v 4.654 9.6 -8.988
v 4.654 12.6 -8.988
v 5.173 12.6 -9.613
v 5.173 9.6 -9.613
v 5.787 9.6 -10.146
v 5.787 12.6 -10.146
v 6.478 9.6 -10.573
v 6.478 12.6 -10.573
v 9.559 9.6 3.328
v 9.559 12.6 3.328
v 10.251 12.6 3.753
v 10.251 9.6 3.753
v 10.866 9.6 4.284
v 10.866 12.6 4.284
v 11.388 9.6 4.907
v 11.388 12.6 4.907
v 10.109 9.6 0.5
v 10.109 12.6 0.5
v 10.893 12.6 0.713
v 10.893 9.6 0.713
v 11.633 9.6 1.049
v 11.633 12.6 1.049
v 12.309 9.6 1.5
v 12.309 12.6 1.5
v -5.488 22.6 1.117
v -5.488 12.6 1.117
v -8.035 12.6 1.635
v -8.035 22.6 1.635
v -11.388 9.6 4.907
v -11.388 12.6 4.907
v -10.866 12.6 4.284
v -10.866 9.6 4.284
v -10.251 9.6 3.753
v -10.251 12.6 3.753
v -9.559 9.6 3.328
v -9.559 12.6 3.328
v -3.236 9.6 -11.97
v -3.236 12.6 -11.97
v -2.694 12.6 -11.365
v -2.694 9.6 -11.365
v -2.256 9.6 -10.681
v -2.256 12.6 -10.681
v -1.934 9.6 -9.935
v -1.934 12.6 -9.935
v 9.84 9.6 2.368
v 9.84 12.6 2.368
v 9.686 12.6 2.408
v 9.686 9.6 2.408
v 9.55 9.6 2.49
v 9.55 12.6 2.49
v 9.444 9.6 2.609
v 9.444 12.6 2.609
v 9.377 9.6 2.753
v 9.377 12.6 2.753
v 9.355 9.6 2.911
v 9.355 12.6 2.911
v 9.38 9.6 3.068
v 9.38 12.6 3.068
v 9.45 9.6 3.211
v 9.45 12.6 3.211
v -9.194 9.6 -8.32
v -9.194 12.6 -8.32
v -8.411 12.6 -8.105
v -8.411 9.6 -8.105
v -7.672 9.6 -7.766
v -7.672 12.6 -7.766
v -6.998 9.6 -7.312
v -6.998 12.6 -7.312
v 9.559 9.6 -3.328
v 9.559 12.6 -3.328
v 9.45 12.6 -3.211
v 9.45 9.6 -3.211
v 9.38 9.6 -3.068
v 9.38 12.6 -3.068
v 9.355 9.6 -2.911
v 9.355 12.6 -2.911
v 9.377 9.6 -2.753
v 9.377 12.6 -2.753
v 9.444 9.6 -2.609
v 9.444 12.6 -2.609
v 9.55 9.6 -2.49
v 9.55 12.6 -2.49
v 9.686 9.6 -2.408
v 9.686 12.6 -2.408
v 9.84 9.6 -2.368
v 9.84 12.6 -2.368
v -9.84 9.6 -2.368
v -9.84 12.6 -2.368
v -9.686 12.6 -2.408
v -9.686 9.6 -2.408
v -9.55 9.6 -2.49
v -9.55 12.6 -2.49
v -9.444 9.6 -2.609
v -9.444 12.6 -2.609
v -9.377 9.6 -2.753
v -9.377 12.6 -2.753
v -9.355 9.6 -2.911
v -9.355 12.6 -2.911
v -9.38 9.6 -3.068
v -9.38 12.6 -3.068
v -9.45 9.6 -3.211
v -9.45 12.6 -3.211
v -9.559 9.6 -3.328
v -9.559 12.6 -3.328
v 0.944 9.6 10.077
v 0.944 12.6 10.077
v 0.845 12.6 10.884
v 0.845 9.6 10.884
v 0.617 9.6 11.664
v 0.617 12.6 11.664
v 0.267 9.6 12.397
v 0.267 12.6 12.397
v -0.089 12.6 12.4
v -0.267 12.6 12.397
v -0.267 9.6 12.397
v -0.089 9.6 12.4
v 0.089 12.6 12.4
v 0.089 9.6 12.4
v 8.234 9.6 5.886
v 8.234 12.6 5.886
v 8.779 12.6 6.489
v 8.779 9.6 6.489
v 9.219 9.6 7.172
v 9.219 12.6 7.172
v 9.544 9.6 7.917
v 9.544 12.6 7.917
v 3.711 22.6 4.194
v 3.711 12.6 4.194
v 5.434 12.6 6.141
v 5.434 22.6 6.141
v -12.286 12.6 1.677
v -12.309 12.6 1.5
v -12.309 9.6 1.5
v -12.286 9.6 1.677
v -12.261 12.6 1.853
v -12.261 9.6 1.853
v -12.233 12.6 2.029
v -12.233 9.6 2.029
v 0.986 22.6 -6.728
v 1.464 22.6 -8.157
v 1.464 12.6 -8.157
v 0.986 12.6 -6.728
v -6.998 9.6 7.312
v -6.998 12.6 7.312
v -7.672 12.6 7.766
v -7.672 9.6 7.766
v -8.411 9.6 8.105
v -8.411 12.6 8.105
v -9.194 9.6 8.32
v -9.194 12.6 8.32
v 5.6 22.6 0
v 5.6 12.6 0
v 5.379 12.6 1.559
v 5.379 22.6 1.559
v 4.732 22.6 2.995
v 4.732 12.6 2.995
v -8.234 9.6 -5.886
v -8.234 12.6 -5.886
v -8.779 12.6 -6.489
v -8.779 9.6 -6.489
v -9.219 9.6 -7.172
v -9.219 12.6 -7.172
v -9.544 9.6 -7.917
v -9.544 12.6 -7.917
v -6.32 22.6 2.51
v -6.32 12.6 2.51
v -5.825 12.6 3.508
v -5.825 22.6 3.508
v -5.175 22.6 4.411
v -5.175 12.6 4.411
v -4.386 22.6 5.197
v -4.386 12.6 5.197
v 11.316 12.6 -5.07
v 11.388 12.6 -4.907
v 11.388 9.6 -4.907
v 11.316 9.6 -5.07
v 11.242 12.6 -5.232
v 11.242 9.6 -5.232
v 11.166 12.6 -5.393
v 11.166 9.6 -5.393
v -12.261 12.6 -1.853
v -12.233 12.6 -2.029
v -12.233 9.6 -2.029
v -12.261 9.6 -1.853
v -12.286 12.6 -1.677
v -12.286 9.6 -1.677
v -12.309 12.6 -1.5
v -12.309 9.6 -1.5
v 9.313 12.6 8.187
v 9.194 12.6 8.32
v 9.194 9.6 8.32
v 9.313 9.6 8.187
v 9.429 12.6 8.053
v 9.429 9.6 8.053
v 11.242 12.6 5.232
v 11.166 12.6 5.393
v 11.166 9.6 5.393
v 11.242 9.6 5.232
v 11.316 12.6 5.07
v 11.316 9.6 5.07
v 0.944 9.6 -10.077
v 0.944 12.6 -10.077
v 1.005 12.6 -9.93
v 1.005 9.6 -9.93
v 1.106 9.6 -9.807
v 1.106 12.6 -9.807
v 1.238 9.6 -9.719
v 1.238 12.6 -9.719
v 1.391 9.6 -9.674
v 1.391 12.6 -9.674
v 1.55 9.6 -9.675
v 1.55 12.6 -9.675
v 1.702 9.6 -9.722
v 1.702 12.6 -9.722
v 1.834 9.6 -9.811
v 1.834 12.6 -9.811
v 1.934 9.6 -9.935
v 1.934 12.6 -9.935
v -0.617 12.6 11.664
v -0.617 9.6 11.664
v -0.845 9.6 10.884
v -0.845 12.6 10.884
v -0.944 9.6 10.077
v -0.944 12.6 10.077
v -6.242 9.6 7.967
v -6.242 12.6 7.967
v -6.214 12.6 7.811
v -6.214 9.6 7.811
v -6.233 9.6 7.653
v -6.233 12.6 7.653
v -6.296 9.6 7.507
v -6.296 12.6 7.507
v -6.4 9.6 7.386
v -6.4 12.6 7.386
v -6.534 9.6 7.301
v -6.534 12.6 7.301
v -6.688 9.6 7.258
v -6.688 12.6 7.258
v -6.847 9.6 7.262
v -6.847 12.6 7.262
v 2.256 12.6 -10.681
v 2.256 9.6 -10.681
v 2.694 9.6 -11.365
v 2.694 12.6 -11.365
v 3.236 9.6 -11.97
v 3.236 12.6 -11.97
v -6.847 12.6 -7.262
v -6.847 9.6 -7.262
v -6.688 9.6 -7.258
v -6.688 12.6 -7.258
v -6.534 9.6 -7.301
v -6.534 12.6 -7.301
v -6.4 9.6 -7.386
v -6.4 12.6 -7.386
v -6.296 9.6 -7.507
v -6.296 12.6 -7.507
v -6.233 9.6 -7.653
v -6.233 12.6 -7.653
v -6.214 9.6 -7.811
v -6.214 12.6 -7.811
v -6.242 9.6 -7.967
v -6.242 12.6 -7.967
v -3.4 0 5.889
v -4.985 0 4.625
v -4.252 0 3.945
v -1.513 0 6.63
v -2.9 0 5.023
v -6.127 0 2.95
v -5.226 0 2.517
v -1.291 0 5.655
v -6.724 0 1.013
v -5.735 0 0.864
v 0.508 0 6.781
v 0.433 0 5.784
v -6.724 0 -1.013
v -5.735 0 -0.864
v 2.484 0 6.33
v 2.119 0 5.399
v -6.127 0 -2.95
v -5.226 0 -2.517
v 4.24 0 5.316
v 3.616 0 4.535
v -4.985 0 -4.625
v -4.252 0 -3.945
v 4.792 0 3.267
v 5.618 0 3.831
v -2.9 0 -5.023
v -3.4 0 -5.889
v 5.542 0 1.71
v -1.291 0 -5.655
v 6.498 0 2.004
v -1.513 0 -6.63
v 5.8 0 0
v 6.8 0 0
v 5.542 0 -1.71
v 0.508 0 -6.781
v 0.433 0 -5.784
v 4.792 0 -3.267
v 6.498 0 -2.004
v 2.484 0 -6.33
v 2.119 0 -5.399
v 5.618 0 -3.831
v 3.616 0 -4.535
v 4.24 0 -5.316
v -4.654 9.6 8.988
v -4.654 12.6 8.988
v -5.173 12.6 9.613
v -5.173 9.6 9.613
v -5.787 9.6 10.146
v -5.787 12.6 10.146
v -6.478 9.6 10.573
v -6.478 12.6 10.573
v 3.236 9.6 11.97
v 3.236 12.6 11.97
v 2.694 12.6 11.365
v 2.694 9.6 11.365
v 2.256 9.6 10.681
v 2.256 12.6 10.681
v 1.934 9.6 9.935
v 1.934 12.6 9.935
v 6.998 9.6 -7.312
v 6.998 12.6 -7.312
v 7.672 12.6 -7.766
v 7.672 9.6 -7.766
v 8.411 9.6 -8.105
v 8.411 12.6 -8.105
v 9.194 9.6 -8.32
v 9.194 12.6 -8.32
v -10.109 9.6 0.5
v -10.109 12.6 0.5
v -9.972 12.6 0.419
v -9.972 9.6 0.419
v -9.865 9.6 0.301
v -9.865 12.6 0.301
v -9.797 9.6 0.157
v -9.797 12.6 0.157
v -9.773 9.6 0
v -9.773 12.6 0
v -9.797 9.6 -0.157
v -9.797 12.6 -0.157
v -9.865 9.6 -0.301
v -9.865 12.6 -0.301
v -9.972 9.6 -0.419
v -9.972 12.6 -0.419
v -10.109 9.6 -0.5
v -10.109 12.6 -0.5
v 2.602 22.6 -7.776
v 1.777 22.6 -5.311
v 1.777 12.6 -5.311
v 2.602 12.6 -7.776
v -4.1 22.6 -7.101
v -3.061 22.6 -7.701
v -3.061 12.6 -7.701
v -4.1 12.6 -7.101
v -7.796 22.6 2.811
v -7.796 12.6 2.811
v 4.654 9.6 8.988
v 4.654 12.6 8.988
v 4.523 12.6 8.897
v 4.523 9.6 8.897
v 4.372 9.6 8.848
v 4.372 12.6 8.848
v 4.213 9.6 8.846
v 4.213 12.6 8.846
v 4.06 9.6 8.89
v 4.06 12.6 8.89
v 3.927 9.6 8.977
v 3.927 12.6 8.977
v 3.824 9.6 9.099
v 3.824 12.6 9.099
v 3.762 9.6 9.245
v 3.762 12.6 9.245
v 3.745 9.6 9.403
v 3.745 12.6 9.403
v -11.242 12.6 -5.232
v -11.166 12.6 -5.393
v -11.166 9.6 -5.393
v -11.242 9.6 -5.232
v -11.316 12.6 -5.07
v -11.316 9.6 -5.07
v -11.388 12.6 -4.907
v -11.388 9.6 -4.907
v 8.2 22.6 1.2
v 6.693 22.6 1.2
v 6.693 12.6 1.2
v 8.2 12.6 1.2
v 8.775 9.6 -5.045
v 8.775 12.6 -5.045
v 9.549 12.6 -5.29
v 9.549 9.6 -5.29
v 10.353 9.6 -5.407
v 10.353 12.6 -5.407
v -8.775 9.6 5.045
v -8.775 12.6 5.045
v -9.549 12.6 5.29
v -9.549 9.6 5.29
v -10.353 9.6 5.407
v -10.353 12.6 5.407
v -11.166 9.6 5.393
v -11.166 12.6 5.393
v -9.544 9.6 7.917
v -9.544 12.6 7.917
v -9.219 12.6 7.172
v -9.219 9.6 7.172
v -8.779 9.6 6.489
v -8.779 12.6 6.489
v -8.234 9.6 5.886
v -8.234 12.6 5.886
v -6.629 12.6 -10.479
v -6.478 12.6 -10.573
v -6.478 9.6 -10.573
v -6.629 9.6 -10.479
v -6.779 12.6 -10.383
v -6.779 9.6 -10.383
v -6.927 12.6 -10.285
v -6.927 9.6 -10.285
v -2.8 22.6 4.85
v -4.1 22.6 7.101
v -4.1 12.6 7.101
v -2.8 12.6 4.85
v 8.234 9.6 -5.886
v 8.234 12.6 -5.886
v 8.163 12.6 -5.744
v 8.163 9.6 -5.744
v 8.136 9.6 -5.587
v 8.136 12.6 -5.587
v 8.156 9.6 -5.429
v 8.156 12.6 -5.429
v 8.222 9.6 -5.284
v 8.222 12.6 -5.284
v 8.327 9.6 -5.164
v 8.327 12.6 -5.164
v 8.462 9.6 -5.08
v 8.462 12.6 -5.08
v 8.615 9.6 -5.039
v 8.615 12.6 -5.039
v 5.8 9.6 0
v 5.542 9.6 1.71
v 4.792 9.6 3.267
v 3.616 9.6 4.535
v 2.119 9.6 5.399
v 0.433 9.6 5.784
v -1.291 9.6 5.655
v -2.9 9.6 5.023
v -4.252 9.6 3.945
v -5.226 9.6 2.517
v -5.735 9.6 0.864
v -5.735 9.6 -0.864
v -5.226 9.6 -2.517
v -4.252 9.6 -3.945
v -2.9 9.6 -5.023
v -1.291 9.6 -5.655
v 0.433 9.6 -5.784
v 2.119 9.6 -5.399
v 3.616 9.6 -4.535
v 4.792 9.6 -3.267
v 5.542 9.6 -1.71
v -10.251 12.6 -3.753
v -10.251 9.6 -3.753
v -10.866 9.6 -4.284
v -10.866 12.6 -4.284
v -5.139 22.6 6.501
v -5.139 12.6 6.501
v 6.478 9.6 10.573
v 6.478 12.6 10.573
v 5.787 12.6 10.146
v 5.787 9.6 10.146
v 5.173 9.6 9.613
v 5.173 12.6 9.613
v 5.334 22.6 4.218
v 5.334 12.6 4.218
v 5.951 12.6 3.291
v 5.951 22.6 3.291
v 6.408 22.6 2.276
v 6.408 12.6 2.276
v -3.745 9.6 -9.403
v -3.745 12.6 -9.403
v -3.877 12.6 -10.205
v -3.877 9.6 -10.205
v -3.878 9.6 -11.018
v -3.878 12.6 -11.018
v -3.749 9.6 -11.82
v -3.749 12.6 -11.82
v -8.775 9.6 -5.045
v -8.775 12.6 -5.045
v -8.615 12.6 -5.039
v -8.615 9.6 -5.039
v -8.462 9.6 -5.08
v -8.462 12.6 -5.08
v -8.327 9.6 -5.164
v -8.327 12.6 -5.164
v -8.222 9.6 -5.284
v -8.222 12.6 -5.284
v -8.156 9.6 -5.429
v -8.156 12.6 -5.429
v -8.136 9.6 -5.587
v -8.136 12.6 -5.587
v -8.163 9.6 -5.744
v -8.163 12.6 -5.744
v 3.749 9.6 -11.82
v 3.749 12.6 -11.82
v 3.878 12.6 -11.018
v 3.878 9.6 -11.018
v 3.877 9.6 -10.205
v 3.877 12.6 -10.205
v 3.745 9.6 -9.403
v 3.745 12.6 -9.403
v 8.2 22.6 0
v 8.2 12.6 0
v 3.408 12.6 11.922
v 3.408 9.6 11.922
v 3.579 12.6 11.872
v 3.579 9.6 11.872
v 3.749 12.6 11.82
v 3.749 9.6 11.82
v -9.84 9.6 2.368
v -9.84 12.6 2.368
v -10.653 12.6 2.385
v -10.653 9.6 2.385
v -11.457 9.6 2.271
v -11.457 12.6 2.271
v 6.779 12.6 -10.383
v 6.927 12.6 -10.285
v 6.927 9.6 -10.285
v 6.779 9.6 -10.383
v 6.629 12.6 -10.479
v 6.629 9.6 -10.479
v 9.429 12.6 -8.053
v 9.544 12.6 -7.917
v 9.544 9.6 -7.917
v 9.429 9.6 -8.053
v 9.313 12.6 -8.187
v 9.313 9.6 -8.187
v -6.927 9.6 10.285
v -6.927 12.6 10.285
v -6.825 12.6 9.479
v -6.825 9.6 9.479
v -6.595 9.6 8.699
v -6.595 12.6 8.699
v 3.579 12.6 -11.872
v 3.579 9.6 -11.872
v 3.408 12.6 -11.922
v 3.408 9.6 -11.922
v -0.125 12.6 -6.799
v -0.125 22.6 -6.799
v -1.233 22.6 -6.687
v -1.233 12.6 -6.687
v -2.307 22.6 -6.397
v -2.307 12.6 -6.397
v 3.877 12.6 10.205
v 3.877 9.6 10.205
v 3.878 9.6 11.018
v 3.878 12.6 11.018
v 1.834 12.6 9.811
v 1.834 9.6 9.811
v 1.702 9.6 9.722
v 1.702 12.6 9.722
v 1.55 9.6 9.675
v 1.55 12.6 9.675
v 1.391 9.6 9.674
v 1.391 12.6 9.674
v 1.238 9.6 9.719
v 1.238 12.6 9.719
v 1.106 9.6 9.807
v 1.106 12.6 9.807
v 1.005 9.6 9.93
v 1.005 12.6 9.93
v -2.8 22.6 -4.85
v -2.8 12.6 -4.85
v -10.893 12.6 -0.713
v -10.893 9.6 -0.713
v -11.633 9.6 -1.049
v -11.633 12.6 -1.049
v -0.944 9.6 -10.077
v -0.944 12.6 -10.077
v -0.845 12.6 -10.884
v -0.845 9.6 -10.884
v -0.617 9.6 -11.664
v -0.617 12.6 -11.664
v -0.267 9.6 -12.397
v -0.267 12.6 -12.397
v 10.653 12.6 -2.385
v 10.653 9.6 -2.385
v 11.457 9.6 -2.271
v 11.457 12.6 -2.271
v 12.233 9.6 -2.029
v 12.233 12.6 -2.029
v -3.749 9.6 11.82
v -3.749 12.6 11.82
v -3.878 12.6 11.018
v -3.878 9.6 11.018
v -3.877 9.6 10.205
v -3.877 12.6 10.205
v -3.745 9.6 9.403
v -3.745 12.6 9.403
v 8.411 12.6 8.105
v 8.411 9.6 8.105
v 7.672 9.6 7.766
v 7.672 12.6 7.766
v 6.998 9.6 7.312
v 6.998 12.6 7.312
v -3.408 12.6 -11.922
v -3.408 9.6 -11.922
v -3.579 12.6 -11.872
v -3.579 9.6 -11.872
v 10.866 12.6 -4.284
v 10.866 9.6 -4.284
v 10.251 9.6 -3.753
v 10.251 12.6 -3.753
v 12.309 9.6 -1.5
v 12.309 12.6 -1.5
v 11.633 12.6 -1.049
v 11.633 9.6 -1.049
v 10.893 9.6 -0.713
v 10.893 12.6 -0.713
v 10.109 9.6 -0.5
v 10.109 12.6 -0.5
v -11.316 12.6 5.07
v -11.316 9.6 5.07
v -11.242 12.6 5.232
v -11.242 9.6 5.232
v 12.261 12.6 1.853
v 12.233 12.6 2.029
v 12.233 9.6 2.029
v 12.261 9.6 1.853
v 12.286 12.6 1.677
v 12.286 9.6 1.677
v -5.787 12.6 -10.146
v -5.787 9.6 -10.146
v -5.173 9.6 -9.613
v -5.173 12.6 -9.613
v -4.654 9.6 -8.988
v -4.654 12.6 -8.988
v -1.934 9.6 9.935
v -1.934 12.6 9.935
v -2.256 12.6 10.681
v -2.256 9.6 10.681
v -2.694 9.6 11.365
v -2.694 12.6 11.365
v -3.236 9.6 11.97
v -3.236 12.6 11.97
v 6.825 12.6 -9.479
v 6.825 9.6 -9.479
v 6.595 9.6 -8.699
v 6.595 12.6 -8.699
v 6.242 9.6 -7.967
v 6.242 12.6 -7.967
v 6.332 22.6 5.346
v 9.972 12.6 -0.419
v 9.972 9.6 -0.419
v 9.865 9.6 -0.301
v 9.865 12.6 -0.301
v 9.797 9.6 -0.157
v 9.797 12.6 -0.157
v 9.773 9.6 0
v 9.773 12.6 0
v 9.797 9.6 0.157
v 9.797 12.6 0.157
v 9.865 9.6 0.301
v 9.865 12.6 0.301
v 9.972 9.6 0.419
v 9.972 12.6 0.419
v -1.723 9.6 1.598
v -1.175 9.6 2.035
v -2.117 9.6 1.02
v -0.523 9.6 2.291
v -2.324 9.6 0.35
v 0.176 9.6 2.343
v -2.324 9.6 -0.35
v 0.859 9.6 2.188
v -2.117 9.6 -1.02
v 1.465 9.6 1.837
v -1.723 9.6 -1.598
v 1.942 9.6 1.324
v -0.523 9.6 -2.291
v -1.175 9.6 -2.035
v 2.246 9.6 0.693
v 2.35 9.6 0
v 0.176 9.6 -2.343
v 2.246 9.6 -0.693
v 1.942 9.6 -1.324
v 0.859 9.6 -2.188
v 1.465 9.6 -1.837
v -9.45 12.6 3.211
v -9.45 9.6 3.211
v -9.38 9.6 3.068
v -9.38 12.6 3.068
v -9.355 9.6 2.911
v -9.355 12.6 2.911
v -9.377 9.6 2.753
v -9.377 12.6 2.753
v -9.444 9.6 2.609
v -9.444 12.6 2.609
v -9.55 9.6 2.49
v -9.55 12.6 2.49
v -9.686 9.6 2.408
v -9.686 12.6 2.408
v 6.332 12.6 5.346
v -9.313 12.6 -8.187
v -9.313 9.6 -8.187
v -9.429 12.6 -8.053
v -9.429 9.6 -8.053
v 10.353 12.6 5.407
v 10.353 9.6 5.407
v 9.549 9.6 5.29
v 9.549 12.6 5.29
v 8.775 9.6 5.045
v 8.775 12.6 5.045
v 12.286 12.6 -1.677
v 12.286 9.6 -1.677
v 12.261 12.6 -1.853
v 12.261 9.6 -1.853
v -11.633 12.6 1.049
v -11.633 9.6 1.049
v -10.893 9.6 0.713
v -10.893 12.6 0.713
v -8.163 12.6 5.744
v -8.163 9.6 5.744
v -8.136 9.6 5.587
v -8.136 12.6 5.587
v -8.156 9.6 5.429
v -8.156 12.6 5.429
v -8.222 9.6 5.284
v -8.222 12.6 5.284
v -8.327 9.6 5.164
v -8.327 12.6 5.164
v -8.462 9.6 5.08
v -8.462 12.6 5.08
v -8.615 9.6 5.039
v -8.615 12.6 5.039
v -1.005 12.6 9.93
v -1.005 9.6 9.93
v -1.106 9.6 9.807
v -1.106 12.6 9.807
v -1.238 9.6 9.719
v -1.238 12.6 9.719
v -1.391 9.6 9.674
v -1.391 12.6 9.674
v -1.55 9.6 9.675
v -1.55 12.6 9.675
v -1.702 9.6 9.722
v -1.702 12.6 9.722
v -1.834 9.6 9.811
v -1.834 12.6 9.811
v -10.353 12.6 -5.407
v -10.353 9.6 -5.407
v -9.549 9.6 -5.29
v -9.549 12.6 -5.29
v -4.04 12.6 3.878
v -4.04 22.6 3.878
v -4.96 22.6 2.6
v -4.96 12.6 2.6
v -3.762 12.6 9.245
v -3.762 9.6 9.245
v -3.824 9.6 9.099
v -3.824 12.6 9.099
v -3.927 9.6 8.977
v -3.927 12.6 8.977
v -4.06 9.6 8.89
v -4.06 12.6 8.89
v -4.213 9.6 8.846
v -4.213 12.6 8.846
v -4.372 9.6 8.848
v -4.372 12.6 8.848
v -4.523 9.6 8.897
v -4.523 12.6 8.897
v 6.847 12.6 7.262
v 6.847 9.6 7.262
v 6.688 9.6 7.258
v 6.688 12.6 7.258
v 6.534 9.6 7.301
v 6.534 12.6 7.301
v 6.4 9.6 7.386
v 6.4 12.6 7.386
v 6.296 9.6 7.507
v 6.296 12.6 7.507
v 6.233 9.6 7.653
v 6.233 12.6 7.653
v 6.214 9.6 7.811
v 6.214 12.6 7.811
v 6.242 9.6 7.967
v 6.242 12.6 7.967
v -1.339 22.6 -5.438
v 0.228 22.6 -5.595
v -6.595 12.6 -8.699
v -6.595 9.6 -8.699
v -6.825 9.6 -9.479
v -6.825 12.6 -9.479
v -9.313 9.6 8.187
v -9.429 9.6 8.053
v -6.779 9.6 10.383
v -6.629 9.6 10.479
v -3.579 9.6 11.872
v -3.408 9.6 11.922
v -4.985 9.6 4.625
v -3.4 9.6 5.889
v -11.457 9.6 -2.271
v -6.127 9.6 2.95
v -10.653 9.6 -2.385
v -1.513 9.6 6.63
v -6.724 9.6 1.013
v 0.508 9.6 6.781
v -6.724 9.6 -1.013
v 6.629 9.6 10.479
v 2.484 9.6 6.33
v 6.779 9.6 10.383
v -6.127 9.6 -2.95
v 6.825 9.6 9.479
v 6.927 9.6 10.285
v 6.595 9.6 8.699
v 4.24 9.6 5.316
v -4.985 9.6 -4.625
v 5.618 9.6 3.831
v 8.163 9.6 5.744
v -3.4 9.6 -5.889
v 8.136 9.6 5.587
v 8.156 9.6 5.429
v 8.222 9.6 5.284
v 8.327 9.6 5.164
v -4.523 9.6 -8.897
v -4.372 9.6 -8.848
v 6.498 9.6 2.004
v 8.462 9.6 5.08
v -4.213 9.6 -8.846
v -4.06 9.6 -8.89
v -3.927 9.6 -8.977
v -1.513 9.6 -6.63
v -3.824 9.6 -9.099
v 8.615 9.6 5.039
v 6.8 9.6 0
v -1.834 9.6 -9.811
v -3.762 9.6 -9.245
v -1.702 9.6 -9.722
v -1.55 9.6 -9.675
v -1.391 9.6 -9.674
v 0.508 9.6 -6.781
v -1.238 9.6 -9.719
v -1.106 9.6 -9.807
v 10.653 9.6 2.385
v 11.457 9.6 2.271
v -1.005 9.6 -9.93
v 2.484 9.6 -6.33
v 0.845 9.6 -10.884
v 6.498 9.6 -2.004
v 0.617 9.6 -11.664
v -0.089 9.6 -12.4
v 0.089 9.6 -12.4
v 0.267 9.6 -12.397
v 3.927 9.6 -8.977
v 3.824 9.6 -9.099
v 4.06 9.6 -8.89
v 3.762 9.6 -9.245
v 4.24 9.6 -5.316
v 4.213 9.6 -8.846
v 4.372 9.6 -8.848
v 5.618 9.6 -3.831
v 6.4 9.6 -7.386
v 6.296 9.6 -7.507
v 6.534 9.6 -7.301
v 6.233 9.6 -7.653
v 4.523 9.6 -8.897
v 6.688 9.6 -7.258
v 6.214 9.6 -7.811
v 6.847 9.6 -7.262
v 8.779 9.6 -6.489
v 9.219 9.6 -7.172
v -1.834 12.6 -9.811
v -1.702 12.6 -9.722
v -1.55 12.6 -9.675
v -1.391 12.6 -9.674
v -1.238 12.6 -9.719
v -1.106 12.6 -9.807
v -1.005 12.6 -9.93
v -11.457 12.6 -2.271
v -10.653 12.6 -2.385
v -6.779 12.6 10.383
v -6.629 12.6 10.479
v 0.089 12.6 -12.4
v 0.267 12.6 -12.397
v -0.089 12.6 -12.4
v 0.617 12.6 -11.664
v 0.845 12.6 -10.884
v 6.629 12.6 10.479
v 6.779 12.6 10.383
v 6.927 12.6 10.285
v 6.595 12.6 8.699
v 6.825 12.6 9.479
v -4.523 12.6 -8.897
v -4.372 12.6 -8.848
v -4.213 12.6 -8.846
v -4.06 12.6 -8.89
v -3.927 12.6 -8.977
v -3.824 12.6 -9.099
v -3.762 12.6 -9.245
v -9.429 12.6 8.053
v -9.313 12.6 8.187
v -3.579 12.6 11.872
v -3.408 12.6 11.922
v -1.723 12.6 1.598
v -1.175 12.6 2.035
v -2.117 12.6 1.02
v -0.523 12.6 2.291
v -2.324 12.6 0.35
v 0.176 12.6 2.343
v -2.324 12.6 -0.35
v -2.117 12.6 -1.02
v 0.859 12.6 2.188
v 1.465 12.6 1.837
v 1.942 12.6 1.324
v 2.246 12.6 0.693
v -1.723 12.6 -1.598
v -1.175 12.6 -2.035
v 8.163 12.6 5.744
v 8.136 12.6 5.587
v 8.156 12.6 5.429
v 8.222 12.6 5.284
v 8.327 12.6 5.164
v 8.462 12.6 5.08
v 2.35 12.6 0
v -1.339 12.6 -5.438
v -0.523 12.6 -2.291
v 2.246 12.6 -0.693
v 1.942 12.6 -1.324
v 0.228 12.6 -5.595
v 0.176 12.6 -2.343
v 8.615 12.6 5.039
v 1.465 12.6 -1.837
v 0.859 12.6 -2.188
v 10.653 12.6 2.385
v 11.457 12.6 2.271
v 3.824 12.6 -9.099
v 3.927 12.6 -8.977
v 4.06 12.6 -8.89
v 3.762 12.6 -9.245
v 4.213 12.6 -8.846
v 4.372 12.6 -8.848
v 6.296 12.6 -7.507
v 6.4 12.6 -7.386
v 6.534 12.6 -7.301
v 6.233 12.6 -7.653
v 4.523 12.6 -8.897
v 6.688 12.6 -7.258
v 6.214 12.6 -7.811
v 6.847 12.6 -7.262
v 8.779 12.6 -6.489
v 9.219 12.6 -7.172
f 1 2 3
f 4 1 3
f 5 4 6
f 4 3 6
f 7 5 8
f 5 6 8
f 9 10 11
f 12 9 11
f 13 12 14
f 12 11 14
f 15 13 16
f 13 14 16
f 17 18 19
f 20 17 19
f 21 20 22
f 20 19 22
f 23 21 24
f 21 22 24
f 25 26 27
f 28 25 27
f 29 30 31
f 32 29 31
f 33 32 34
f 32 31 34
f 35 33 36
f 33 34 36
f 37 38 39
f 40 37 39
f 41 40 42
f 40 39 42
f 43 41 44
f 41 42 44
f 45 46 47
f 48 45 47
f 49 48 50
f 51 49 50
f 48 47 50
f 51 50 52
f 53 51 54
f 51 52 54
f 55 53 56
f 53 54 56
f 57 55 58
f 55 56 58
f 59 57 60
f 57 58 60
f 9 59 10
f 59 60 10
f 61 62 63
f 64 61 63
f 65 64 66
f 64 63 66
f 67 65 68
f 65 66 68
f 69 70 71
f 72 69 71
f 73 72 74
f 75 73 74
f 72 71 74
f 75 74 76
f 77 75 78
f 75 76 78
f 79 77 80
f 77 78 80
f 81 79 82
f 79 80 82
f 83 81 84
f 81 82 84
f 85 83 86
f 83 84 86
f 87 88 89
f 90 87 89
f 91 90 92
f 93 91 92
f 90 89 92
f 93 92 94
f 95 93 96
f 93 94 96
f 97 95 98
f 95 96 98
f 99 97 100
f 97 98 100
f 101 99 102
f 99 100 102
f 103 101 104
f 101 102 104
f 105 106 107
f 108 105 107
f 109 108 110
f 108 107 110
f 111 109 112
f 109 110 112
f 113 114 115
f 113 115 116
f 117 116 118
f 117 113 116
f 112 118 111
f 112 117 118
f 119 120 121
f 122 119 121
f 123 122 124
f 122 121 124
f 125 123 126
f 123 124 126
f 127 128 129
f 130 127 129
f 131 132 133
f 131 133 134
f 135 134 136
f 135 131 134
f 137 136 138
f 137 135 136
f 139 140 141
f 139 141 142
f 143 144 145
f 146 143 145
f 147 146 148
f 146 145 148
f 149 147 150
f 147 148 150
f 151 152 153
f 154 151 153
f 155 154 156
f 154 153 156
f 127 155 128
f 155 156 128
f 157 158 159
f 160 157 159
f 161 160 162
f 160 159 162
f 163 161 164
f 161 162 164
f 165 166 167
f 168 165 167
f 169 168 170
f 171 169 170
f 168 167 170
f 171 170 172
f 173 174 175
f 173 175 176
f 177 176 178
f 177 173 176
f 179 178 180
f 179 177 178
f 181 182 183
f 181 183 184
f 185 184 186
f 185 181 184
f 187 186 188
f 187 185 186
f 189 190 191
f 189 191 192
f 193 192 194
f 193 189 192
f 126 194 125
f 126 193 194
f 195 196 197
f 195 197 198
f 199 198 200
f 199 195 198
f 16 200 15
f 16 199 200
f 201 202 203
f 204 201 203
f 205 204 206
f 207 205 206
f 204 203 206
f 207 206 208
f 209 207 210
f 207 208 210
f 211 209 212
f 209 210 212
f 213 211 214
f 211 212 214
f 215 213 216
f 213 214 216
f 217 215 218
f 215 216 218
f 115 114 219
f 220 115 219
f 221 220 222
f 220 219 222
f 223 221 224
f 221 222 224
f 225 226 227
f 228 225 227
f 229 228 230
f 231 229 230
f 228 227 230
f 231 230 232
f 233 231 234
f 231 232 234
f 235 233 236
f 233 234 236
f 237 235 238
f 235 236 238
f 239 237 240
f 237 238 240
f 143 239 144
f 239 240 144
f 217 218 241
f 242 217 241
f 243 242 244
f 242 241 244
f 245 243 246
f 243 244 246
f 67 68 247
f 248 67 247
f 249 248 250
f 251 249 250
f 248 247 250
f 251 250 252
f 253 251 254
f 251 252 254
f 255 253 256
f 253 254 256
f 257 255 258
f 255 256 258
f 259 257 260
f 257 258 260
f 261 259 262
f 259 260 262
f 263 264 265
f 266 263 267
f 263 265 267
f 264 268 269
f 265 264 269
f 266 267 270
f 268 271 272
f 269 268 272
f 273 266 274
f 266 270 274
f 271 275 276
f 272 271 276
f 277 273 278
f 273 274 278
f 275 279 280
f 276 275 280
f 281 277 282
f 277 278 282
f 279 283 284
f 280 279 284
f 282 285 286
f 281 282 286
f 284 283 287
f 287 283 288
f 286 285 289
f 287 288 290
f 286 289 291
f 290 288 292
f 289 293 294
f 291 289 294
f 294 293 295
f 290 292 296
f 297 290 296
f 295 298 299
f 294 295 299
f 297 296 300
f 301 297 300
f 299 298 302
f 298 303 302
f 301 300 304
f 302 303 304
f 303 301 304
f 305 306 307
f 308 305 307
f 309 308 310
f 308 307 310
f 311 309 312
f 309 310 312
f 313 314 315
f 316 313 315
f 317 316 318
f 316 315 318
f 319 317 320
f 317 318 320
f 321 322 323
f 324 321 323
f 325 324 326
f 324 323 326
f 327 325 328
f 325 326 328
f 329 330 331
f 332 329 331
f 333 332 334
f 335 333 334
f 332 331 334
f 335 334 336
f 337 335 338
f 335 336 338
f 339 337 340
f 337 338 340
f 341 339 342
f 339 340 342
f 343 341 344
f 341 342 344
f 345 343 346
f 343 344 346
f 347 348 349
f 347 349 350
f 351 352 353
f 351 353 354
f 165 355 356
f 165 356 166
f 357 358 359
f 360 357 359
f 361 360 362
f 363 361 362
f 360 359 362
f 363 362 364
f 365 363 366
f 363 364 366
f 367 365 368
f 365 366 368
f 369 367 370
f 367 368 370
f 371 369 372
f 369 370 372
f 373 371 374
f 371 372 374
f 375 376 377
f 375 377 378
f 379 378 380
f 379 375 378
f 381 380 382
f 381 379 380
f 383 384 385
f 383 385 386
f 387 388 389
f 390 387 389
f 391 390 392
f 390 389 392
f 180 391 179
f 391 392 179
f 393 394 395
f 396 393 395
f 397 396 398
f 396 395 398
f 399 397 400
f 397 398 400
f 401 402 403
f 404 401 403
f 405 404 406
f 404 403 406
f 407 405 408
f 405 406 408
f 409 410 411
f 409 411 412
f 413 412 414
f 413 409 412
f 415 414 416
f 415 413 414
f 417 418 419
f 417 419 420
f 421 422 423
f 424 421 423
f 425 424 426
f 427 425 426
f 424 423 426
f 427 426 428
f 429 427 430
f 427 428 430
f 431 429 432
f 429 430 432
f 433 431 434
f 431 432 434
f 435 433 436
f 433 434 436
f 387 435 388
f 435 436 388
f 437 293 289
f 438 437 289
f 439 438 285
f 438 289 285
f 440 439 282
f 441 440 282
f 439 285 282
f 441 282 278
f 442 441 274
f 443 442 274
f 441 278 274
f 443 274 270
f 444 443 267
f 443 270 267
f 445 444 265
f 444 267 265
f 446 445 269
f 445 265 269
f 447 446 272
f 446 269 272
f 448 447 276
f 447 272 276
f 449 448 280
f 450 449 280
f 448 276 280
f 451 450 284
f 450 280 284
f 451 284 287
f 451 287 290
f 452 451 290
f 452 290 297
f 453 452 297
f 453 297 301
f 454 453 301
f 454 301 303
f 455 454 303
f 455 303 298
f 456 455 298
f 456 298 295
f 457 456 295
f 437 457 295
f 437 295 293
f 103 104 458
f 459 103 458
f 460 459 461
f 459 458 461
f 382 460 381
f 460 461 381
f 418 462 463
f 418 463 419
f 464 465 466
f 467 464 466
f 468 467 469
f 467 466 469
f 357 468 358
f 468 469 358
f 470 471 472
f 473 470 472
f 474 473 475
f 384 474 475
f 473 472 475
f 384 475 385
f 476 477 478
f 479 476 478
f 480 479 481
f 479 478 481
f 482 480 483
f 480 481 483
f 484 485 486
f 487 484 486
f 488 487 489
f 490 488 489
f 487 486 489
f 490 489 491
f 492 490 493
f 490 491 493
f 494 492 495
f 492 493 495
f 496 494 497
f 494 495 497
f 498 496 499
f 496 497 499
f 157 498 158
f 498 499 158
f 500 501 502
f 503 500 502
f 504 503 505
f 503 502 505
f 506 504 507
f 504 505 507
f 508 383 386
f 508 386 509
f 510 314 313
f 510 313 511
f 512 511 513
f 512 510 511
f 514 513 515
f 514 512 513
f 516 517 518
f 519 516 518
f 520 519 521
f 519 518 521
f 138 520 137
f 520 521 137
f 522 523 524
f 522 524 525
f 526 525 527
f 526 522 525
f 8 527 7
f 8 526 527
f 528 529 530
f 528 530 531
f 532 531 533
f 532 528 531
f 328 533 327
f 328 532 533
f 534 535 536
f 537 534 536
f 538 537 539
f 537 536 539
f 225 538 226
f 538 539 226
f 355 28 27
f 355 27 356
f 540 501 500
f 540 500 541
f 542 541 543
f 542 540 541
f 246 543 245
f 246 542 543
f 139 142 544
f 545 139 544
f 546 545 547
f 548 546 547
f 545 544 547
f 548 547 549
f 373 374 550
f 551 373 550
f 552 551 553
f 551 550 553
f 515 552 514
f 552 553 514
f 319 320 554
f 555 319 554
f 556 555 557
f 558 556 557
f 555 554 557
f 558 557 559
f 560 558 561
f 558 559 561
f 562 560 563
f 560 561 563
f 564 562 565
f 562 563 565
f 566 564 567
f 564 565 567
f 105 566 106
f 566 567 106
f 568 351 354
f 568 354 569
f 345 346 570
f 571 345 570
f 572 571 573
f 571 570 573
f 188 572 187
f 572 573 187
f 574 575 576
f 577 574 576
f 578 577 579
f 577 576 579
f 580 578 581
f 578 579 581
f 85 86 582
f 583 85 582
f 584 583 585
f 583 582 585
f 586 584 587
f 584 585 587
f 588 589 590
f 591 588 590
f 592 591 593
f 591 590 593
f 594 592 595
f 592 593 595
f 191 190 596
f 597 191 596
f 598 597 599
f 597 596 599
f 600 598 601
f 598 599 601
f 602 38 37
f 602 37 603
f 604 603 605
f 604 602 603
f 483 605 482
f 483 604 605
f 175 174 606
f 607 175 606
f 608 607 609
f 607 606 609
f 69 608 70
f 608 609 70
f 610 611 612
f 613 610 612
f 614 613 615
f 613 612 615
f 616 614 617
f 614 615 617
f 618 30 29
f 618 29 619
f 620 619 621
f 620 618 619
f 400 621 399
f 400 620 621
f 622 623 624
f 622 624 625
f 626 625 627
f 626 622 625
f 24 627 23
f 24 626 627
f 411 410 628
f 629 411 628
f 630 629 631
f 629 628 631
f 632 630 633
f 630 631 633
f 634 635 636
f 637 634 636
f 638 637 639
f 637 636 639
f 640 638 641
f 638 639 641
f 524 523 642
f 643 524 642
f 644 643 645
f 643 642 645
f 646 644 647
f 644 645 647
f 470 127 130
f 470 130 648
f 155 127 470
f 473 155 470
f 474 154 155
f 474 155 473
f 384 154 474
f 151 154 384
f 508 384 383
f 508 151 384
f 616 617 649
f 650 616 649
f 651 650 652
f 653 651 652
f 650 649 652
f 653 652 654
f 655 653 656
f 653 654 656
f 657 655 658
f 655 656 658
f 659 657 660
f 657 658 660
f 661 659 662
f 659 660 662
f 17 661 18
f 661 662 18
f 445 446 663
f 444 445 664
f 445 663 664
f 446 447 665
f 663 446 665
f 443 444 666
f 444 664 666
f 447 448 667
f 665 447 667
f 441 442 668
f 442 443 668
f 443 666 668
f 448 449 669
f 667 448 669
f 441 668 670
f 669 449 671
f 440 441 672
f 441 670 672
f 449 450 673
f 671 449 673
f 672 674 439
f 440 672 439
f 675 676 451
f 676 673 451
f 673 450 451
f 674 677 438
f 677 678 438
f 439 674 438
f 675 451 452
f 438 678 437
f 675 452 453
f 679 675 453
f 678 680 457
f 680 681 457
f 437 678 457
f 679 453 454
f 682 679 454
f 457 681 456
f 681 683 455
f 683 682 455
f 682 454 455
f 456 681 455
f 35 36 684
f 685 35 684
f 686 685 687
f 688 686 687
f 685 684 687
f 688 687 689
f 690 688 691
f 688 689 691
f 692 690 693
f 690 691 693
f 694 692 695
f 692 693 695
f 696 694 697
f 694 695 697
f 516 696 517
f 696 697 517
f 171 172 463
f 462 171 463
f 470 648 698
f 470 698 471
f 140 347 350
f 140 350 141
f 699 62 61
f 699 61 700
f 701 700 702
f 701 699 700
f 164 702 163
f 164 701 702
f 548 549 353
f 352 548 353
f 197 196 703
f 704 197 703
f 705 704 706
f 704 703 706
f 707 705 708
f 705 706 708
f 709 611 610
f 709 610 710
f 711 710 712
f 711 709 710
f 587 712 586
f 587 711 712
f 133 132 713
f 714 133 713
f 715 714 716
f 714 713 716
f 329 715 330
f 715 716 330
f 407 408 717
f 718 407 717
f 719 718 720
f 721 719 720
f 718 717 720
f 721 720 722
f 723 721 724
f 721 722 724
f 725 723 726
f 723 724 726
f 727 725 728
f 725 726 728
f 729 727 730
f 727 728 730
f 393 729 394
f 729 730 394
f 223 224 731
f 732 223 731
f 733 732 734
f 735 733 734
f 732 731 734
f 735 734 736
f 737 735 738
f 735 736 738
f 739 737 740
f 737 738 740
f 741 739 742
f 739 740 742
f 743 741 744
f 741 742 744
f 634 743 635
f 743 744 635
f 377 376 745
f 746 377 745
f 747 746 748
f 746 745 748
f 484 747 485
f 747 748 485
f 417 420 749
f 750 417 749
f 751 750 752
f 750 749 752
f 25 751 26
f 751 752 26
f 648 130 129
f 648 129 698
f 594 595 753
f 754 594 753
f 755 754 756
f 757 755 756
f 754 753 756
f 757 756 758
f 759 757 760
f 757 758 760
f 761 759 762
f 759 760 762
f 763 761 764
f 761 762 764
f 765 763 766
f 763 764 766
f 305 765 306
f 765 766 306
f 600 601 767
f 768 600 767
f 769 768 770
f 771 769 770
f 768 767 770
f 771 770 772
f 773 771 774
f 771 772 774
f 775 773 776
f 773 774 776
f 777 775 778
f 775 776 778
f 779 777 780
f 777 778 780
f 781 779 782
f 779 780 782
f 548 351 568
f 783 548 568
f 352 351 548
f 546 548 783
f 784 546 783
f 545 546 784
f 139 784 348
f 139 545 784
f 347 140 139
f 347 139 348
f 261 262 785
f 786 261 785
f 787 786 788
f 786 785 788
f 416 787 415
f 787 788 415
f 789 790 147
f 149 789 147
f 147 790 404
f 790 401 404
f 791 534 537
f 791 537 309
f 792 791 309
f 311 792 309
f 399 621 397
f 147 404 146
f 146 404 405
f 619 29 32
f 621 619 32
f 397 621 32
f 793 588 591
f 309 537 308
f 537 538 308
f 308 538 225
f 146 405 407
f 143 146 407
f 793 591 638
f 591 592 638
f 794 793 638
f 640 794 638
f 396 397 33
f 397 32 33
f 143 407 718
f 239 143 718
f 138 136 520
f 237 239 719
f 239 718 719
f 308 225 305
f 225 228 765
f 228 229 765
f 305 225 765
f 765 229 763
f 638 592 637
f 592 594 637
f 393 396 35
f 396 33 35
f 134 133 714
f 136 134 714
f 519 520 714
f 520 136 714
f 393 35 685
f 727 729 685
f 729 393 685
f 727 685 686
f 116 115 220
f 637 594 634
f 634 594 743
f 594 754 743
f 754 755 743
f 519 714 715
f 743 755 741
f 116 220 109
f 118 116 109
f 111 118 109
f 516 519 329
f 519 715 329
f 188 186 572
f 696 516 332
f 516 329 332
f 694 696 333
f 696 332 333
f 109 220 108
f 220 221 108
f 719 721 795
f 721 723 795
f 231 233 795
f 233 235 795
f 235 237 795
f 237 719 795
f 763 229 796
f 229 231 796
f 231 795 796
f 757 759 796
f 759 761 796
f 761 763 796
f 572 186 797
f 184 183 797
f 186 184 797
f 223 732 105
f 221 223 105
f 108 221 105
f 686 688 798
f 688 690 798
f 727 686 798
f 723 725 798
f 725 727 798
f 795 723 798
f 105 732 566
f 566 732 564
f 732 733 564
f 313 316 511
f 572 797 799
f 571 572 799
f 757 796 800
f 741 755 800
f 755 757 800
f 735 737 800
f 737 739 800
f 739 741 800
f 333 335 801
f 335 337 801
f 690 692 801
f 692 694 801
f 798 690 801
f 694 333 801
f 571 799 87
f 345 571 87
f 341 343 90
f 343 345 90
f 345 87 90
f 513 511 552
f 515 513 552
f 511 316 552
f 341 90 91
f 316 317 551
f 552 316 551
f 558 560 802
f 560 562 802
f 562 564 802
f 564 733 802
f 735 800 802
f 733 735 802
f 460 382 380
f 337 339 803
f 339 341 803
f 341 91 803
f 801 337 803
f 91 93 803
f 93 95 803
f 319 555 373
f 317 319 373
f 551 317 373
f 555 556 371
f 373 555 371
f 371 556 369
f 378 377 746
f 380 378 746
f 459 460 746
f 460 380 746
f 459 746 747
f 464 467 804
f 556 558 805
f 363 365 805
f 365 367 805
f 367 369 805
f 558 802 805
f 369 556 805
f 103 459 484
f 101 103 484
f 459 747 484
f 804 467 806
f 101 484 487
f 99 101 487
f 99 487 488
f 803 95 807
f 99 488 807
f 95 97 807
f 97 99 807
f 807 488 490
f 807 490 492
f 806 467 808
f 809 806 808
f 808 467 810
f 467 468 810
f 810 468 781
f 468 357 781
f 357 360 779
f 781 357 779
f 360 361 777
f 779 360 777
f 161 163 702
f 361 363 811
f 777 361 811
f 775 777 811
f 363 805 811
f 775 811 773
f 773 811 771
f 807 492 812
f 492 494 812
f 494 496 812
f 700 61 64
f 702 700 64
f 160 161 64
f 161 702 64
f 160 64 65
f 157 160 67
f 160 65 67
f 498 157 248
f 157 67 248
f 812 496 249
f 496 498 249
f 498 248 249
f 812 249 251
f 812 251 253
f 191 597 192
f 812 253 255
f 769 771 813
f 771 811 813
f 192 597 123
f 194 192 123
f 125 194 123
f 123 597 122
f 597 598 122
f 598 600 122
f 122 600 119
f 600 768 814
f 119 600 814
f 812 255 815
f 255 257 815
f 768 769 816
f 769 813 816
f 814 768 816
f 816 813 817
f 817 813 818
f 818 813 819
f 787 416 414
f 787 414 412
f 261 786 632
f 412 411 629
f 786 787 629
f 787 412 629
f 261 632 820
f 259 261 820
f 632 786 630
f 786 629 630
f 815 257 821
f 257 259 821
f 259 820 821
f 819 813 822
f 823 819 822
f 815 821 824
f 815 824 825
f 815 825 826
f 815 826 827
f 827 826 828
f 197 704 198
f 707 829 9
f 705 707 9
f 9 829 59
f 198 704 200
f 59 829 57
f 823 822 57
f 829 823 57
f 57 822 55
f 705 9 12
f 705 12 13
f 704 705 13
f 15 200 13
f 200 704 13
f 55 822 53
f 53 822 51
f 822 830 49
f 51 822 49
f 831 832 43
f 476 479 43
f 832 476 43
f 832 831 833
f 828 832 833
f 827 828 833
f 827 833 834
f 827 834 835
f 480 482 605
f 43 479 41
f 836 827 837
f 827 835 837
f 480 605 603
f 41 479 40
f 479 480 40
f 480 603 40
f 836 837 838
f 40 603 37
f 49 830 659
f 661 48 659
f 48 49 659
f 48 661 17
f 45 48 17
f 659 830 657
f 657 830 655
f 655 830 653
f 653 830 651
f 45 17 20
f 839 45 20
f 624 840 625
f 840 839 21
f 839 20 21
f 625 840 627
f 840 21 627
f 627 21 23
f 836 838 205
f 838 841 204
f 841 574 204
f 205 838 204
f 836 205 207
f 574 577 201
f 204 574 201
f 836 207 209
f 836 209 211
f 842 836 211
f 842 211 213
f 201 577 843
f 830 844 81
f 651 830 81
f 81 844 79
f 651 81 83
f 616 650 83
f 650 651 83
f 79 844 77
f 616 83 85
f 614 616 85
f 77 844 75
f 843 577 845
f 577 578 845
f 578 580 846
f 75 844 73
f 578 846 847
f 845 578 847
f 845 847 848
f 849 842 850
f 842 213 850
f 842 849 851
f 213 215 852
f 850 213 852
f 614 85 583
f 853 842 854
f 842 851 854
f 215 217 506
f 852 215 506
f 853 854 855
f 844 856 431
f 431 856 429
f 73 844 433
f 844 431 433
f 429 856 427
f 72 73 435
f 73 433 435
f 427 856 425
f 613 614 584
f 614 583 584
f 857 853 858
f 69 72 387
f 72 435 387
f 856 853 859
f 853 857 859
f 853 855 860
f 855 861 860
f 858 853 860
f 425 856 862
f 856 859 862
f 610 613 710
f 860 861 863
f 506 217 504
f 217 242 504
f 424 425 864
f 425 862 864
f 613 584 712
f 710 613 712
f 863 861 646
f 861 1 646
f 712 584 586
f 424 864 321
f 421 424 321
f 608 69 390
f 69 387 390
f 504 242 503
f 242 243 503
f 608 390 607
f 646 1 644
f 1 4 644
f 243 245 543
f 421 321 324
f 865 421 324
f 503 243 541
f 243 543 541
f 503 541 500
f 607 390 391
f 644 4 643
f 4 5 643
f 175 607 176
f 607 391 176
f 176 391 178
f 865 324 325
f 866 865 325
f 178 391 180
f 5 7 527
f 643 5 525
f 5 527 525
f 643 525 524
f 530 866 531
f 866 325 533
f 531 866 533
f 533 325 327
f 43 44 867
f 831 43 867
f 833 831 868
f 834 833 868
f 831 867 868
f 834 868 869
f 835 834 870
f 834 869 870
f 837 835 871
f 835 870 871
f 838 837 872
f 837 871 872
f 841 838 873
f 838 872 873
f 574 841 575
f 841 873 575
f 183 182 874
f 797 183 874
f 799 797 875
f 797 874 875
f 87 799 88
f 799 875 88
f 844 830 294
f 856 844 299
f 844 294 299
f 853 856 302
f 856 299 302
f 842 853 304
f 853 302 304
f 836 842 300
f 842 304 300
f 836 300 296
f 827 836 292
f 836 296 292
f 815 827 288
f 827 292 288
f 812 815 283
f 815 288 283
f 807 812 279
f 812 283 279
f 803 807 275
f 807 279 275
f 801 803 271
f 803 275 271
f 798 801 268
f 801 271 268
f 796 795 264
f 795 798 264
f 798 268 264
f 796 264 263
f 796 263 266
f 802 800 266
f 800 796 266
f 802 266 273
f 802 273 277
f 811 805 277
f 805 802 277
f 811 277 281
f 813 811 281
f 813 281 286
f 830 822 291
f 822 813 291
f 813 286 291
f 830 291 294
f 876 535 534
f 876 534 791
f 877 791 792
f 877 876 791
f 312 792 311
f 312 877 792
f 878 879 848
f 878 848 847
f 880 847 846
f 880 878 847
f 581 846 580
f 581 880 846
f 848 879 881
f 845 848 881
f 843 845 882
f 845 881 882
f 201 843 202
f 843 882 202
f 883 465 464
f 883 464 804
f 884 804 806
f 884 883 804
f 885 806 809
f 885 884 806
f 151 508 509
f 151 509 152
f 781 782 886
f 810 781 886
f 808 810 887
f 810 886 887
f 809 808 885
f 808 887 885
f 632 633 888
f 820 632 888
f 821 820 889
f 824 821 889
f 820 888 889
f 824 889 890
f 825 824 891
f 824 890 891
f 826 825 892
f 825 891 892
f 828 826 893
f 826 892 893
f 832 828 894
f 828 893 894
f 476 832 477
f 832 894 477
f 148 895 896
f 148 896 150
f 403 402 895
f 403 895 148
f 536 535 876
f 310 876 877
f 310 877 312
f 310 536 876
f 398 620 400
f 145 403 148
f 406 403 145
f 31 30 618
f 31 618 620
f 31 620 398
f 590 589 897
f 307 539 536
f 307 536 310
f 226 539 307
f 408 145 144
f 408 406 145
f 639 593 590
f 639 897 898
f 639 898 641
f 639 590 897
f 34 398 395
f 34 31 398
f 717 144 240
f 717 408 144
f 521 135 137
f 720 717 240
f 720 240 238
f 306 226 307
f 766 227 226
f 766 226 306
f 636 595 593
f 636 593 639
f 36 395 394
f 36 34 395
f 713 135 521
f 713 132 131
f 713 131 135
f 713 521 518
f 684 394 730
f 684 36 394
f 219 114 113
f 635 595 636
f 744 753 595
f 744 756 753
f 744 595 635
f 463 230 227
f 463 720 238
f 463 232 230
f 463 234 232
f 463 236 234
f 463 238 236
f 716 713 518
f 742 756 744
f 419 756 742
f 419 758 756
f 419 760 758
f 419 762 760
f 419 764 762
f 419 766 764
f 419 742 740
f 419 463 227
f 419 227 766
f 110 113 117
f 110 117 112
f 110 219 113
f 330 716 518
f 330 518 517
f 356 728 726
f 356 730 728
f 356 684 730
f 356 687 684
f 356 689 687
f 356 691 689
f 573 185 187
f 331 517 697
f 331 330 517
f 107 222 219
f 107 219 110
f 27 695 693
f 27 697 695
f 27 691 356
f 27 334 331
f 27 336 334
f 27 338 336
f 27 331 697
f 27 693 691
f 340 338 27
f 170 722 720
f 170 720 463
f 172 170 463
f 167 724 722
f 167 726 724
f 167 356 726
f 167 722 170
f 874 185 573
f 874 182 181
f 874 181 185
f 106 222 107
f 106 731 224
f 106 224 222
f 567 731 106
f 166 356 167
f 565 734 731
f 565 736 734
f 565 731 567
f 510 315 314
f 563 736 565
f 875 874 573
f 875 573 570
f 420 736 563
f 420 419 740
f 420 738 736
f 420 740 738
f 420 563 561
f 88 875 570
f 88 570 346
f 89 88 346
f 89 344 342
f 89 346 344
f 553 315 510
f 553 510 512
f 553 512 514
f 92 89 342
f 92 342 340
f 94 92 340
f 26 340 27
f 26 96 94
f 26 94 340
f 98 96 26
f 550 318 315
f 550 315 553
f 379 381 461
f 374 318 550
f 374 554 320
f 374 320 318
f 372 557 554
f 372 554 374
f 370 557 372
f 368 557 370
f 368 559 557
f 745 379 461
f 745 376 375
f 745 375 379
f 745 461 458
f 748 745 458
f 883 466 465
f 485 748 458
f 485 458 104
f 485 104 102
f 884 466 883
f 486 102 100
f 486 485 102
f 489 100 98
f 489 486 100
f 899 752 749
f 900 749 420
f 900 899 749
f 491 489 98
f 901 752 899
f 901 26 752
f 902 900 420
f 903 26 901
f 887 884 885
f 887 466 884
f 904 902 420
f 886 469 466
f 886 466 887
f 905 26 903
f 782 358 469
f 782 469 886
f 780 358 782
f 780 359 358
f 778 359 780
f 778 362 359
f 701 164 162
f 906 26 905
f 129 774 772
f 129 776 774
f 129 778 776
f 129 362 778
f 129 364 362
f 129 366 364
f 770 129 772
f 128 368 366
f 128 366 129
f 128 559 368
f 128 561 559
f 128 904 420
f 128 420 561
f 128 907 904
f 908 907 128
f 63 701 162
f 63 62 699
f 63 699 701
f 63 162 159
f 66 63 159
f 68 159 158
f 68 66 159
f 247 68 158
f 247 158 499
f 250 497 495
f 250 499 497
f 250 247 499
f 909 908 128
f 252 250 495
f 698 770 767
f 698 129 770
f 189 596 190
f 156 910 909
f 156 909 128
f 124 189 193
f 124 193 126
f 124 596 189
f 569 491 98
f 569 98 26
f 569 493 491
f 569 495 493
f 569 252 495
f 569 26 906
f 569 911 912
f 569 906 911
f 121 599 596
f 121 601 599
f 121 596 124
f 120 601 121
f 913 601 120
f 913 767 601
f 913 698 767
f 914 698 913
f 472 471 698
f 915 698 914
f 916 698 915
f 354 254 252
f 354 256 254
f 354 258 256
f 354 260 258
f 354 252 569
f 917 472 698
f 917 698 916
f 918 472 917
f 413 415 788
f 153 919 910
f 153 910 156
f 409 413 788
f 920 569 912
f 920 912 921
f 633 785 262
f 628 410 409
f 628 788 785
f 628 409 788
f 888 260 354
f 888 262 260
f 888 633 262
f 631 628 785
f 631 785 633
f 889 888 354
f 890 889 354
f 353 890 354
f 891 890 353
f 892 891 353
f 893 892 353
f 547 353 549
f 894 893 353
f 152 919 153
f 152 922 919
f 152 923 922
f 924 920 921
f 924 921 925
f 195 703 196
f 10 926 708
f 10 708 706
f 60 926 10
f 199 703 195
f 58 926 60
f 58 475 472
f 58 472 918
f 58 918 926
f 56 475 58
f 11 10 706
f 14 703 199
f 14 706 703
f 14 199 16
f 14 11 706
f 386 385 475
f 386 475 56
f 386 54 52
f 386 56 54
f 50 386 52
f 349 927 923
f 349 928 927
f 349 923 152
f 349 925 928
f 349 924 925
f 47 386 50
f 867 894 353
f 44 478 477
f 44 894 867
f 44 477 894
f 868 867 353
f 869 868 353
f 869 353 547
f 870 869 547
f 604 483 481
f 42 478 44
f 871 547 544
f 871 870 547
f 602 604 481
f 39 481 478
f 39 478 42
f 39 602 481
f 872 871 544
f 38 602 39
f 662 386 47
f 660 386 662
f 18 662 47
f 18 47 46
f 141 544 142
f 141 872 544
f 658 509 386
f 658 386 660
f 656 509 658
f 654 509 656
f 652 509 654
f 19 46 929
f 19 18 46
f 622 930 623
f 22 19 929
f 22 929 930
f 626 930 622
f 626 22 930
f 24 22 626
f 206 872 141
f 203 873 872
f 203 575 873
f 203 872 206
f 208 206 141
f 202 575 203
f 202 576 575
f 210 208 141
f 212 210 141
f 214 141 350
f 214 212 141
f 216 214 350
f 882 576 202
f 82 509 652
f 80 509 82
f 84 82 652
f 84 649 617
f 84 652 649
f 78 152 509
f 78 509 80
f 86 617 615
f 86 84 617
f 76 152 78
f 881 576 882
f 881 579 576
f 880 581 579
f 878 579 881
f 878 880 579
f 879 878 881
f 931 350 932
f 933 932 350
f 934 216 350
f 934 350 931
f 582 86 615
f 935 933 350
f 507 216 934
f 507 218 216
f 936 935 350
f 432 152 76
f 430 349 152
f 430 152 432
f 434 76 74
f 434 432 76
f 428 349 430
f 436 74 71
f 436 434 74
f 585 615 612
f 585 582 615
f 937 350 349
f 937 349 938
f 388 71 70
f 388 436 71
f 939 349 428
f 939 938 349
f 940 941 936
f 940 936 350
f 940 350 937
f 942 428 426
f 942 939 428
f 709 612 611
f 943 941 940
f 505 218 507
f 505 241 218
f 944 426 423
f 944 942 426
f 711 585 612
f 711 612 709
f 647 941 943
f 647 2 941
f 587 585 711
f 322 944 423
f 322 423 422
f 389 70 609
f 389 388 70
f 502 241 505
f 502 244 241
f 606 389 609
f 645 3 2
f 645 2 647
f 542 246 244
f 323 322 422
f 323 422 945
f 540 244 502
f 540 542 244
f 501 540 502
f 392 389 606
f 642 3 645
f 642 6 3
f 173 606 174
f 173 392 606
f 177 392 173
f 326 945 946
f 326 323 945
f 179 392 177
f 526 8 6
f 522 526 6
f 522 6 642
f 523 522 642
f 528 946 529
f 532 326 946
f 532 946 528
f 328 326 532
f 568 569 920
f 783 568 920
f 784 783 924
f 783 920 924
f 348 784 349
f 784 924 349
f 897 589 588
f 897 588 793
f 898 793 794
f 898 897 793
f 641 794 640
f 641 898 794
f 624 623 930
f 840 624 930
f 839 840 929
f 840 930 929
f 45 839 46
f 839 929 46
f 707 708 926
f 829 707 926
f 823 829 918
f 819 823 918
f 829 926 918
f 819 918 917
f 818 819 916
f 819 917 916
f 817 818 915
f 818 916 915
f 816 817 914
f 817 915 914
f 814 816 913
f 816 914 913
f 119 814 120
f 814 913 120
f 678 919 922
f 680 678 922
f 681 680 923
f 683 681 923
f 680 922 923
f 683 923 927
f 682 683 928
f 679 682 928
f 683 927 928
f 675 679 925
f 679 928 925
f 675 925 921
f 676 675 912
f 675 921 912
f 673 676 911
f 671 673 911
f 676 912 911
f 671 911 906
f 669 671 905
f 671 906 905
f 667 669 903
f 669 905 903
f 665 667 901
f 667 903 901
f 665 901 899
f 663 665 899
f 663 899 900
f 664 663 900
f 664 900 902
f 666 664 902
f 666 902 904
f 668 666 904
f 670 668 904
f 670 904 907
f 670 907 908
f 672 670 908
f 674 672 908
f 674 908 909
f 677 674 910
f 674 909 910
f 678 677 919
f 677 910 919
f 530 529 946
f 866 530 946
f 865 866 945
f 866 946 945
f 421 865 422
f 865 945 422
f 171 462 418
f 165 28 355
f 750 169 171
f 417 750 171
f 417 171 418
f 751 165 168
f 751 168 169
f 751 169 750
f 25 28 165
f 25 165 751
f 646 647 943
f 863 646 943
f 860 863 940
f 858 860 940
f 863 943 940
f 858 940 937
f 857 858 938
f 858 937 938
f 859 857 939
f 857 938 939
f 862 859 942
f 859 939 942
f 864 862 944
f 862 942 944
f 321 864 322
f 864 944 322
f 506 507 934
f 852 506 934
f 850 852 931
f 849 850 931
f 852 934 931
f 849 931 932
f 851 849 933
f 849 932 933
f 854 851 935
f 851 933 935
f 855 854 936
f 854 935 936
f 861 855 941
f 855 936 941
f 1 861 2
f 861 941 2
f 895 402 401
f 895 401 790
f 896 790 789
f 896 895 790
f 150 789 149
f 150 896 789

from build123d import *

# Parameters (mm, degrees)
SKETCH1_R           = 6.8
BOSS_EXTRUDE1_DEPTH = 12.6
SKETCH2_R           = 5.8
CUT_EXTRUDE1_DEPTH  = 13.6
SKETCH3_R           = 12.4
BOSS_EXTRUDE3_DEPTH = 3
SKETCH4_R           = 2.35
CUT_EXTRUDE2_DEPTH  = 3
CUT_EXTRUDE3_DEPTH  = 3
CIRPATTERN1_COUNT   = 22
BOSS_EXTRUDE4_DEPTH = 10


with BuildPart() as part:
    # Sketch1 → Boss-Extrude1 (new body)
    with BuildSketch(Plane(origin=(0, 0, 0), x_dir=(1, 0, 0), z_dir=(0, 1, 0))):
        Circle(SKETCH1_R)
    extrude(amount=BOSS_EXTRUDE1_DEPTH)

    # Sketch2 → Cut-Extrude1 (cut, through all)
    with BuildSketch(Plane.XZ):
        Circle(SKETCH2_R)
    extrude(amount=-CUT_EXTRUDE1_DEPTH, mode=Mode.SUBTRACT)

    # Sketch3 → Boss-Extrude3 (add)
    with BuildSketch(Plane(origin=(0, 12.6, 0), x_dir=(1, 0, 0), z_dir=(0, 1, 0))):
        Circle(SKETCH3_R)
    extrude(amount=-BOSS_EXTRUDE3_DEPTH)

    # Sketch4 → Cut-Extrude2 (cut)
    with BuildSketch(Plane(origin=(0, 12.6, 0), x_dir=(1, 0, 0), z_dir=(0, 1, 0))):
        Circle(SKETCH4_R)
    extrude(amount=-CUT_EXTRUDE2_DEPTH, mode=Mode.SUBTRACT)

    # Sketch5 → Cut-Extrude3 (cut)
    with BuildSketch(Plane(origin=(0, 12.6, 0), x_dir=(1, 0, 0), z_dir=(0, 1, 0))):
        with BuildLine():
            ThreePointArc((12.308939841, -1.5), (12.4, 0), (12.308939841, 1.5))
            ThreePointArc((12.308939841, 1.5), (11.269957917, 0.865760233), (10.108939841, 0.5))
            ThreePointArc((10.108939841, 0.5), (9.773209975, 0), (10.108939841, -0.5))
            ThreePointArc((10.108939841, -0.5), (11.269957917, -0.865760233), (12.308939841, -1.5))
        make_face()
    cut_extrude3 = extrude(amount=-CUT_EXTRUDE3_DEPTH, mode=Mode.SUBTRACT)

    # CirPattern1: Cut-Extrude3 ×22 about axis
    cirpattern1_axis = Axis((0, 0, 0), (0, 1, 0))
    for i in range(1, CIRPATTERN1_COUNT):
        add(cut_extrude3.rotate(cirpattern1_axis, i * 360 / CIRPATTERN1_COUNT), mode=Mode.SUBTRACT)

    # Sketch6 → Boss-Extrude4 (add)
    with BuildSketch(Plane(origin=(0, 12.6, 0), x_dir=(1, 0, 0), z_dir=(0, 1, 0))):
        with BuildLine():
            Line((8.2, 0), (5.6, 0))
            ThreePointArc((5.6, 0), (5.105878964, -2.3), (3.710714286, -4.194114864))
            Line((3.710714286, -4.194114864), (5.433545918, -6.141382479))
            Line((5.433545918, -6.141382479), (6.332284818, -5.346229418))
            Line((6.332284818, -5.346229418), (5.333890775, -4.217773015))
            ThreePointArc((5.333890775, -4.217773015), (6.199995885, -2.792857143), (6.693280212, -1.2))
            Line((6.693280212, -1.2), (8.2, -1.2))
            Line((8.2, -1.2), (8.2, 0))
        make_face()
        with BuildLine():
            Line((-8.0353662, -1.634897558), (-7.796112899, -2.810804807))
            Line((-7.796112899, -2.810804807), (-6.319643965, -2.510398405))
            ThreePointArc((-6.319643965, -2.510398405), (-5.518683178, -3.972925369), (-4.385870591, -5.196550698))
            Line((-4.385870591, -5.196550698), (-5.139230485, -6.501408311))
            Line((-5.139230485, -6.501408311), (-4.1, -7.101408311))
            Line((-4.1, -7.101408311), (-2.8, -4.849742261))
            ThreePointArc((-2.8, -4.849742261), (-4.544797911, -3.271820892), (-5.487567161, -1.116515406))
            Line((-5.487567161, -1.116515406), (-8.0353662, -1.634897558))
        make_face()
        with BuildLine():
            Line((2.601820282, 7.776280037), (1.463828081, 8.157034225))
            Line((1.463828081, 8.157034225), (0.985753191, 6.728171419))
            ThreePointArc((0.985753191, 6.728171419), (-0.681312708, 6.765782512), (-2.307409622, 6.396550698))
            Line((-2.307409622, 6.396550698), (-3.060769515, 7.701408311))
            Line((-3.060769515, 7.701408311), (-4.1, 7.101408311))
            Line((-4.1, 7.101408311), (-2.8, 4.849742261))
            ThreePointArc((-2.8, 4.849742261), (-0.561081054, 5.571820892), (1.776852875, 5.310630269))
            Line((1.776852875, 5.310630269), (2.601820282, 7.776280037))
        make_face()
    extrude(amount=BOSS_EXTRUDE4_DEPTH)


solid = part.part
